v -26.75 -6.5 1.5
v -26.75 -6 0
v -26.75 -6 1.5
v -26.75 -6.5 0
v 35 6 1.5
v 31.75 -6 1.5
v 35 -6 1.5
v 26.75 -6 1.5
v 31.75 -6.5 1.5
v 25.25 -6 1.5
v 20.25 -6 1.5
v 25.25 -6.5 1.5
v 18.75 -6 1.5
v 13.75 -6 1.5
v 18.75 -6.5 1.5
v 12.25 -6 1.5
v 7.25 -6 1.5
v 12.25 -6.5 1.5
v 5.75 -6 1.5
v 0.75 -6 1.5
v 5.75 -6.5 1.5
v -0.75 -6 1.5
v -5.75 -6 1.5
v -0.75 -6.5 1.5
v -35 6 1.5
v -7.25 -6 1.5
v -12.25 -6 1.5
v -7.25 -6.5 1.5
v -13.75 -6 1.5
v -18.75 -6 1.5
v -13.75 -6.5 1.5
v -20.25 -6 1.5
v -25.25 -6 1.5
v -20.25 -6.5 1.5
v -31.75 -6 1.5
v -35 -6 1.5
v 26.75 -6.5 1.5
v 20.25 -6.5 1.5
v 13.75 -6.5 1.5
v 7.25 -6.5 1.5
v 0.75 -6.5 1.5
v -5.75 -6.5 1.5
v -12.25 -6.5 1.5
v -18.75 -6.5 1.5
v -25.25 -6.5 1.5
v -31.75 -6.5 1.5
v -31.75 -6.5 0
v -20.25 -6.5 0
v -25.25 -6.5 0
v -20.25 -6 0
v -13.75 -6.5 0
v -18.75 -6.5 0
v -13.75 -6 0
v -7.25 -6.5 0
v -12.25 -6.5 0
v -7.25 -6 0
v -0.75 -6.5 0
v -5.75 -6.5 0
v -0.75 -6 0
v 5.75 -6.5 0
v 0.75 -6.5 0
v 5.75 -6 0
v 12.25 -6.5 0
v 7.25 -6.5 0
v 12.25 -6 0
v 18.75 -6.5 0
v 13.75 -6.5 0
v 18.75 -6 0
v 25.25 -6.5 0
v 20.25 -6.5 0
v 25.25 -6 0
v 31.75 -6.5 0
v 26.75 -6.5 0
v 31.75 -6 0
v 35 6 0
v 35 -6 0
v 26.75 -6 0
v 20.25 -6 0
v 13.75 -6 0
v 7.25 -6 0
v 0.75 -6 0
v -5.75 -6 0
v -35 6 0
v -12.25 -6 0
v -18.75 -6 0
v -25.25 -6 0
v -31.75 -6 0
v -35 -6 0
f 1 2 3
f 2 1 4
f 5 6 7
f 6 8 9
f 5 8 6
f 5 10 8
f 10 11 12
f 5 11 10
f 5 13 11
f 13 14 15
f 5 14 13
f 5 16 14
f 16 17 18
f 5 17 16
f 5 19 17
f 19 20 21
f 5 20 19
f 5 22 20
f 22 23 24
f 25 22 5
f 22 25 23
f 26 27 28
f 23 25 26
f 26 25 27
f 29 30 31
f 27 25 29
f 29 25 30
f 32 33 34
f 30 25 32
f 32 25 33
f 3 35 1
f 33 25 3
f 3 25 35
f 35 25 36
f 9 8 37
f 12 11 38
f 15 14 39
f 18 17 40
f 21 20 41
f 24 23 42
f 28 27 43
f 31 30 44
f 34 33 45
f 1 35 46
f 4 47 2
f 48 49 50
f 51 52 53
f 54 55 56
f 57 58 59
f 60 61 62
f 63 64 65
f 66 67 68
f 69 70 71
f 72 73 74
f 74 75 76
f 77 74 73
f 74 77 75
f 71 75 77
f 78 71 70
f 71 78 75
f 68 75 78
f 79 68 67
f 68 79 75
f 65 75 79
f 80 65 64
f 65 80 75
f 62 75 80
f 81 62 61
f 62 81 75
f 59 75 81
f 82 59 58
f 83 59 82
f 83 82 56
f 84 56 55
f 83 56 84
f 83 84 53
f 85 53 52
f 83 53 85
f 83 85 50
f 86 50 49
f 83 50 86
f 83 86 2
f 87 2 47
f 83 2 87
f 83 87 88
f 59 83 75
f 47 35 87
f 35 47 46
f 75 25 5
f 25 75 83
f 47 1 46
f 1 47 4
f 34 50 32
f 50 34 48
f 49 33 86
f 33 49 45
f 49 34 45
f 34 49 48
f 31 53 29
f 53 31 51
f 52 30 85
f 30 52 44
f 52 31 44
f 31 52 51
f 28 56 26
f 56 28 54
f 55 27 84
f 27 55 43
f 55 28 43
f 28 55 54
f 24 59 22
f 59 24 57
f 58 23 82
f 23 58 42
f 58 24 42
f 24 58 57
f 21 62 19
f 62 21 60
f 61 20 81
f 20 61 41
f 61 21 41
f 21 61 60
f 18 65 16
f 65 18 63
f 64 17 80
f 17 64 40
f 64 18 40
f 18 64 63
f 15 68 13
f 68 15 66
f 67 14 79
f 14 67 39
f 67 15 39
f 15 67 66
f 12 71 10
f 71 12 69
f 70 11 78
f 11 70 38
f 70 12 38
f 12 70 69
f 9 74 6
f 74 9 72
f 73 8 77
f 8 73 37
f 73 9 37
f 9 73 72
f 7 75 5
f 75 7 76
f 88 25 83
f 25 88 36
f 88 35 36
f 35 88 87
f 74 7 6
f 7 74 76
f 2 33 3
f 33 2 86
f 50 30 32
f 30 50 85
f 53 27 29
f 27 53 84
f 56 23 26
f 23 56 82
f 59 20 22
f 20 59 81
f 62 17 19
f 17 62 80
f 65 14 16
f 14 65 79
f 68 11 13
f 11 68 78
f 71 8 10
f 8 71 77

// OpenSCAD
// 10-well comb for casting agarose gels
// Print orientation: flat on bed, teeth pointing down (-Y)

// ---- Dimensions (mm) ----
plate_t      = 1.5;   // plate thickness (Z)
spine_l      = 70;    // spine length (X)
spine_w      = 12;    // spine width (Y)
tooth_w      = 5.0;   // tooth width (X)
tooth_l      = 12;    // tooth length (Y)
tooth_count  = 10;    // number of teeth
gap          = 1.5;   // gap between teeth (X)
embed        = 0.5;   // tooth overlap into spine for a clean union

$fn = 64;

// ---- Derived ----
pitch   = tooth_w + gap;            // centre-to-centre spacing
x_start = -(tooth_count - 1) * pitch / 2;  // first tooth centre (row centred)

// ---- Model ----
union() {
    // Spine (back bar)
    translate([-spine_l / 2, -spine_w / 2, 0])
        cube([spine_l, spine_w, plate_t]);

    // Teeth hanging in -Y
    for (i = [0 : tooth_count - 1])
        translate([x_start + i * pitch - tooth_w / 2,
                   -spine_w / 2 - embed,
                   0])
            cube([tooth_w, tooth_l + embed, plate_t]);
}
